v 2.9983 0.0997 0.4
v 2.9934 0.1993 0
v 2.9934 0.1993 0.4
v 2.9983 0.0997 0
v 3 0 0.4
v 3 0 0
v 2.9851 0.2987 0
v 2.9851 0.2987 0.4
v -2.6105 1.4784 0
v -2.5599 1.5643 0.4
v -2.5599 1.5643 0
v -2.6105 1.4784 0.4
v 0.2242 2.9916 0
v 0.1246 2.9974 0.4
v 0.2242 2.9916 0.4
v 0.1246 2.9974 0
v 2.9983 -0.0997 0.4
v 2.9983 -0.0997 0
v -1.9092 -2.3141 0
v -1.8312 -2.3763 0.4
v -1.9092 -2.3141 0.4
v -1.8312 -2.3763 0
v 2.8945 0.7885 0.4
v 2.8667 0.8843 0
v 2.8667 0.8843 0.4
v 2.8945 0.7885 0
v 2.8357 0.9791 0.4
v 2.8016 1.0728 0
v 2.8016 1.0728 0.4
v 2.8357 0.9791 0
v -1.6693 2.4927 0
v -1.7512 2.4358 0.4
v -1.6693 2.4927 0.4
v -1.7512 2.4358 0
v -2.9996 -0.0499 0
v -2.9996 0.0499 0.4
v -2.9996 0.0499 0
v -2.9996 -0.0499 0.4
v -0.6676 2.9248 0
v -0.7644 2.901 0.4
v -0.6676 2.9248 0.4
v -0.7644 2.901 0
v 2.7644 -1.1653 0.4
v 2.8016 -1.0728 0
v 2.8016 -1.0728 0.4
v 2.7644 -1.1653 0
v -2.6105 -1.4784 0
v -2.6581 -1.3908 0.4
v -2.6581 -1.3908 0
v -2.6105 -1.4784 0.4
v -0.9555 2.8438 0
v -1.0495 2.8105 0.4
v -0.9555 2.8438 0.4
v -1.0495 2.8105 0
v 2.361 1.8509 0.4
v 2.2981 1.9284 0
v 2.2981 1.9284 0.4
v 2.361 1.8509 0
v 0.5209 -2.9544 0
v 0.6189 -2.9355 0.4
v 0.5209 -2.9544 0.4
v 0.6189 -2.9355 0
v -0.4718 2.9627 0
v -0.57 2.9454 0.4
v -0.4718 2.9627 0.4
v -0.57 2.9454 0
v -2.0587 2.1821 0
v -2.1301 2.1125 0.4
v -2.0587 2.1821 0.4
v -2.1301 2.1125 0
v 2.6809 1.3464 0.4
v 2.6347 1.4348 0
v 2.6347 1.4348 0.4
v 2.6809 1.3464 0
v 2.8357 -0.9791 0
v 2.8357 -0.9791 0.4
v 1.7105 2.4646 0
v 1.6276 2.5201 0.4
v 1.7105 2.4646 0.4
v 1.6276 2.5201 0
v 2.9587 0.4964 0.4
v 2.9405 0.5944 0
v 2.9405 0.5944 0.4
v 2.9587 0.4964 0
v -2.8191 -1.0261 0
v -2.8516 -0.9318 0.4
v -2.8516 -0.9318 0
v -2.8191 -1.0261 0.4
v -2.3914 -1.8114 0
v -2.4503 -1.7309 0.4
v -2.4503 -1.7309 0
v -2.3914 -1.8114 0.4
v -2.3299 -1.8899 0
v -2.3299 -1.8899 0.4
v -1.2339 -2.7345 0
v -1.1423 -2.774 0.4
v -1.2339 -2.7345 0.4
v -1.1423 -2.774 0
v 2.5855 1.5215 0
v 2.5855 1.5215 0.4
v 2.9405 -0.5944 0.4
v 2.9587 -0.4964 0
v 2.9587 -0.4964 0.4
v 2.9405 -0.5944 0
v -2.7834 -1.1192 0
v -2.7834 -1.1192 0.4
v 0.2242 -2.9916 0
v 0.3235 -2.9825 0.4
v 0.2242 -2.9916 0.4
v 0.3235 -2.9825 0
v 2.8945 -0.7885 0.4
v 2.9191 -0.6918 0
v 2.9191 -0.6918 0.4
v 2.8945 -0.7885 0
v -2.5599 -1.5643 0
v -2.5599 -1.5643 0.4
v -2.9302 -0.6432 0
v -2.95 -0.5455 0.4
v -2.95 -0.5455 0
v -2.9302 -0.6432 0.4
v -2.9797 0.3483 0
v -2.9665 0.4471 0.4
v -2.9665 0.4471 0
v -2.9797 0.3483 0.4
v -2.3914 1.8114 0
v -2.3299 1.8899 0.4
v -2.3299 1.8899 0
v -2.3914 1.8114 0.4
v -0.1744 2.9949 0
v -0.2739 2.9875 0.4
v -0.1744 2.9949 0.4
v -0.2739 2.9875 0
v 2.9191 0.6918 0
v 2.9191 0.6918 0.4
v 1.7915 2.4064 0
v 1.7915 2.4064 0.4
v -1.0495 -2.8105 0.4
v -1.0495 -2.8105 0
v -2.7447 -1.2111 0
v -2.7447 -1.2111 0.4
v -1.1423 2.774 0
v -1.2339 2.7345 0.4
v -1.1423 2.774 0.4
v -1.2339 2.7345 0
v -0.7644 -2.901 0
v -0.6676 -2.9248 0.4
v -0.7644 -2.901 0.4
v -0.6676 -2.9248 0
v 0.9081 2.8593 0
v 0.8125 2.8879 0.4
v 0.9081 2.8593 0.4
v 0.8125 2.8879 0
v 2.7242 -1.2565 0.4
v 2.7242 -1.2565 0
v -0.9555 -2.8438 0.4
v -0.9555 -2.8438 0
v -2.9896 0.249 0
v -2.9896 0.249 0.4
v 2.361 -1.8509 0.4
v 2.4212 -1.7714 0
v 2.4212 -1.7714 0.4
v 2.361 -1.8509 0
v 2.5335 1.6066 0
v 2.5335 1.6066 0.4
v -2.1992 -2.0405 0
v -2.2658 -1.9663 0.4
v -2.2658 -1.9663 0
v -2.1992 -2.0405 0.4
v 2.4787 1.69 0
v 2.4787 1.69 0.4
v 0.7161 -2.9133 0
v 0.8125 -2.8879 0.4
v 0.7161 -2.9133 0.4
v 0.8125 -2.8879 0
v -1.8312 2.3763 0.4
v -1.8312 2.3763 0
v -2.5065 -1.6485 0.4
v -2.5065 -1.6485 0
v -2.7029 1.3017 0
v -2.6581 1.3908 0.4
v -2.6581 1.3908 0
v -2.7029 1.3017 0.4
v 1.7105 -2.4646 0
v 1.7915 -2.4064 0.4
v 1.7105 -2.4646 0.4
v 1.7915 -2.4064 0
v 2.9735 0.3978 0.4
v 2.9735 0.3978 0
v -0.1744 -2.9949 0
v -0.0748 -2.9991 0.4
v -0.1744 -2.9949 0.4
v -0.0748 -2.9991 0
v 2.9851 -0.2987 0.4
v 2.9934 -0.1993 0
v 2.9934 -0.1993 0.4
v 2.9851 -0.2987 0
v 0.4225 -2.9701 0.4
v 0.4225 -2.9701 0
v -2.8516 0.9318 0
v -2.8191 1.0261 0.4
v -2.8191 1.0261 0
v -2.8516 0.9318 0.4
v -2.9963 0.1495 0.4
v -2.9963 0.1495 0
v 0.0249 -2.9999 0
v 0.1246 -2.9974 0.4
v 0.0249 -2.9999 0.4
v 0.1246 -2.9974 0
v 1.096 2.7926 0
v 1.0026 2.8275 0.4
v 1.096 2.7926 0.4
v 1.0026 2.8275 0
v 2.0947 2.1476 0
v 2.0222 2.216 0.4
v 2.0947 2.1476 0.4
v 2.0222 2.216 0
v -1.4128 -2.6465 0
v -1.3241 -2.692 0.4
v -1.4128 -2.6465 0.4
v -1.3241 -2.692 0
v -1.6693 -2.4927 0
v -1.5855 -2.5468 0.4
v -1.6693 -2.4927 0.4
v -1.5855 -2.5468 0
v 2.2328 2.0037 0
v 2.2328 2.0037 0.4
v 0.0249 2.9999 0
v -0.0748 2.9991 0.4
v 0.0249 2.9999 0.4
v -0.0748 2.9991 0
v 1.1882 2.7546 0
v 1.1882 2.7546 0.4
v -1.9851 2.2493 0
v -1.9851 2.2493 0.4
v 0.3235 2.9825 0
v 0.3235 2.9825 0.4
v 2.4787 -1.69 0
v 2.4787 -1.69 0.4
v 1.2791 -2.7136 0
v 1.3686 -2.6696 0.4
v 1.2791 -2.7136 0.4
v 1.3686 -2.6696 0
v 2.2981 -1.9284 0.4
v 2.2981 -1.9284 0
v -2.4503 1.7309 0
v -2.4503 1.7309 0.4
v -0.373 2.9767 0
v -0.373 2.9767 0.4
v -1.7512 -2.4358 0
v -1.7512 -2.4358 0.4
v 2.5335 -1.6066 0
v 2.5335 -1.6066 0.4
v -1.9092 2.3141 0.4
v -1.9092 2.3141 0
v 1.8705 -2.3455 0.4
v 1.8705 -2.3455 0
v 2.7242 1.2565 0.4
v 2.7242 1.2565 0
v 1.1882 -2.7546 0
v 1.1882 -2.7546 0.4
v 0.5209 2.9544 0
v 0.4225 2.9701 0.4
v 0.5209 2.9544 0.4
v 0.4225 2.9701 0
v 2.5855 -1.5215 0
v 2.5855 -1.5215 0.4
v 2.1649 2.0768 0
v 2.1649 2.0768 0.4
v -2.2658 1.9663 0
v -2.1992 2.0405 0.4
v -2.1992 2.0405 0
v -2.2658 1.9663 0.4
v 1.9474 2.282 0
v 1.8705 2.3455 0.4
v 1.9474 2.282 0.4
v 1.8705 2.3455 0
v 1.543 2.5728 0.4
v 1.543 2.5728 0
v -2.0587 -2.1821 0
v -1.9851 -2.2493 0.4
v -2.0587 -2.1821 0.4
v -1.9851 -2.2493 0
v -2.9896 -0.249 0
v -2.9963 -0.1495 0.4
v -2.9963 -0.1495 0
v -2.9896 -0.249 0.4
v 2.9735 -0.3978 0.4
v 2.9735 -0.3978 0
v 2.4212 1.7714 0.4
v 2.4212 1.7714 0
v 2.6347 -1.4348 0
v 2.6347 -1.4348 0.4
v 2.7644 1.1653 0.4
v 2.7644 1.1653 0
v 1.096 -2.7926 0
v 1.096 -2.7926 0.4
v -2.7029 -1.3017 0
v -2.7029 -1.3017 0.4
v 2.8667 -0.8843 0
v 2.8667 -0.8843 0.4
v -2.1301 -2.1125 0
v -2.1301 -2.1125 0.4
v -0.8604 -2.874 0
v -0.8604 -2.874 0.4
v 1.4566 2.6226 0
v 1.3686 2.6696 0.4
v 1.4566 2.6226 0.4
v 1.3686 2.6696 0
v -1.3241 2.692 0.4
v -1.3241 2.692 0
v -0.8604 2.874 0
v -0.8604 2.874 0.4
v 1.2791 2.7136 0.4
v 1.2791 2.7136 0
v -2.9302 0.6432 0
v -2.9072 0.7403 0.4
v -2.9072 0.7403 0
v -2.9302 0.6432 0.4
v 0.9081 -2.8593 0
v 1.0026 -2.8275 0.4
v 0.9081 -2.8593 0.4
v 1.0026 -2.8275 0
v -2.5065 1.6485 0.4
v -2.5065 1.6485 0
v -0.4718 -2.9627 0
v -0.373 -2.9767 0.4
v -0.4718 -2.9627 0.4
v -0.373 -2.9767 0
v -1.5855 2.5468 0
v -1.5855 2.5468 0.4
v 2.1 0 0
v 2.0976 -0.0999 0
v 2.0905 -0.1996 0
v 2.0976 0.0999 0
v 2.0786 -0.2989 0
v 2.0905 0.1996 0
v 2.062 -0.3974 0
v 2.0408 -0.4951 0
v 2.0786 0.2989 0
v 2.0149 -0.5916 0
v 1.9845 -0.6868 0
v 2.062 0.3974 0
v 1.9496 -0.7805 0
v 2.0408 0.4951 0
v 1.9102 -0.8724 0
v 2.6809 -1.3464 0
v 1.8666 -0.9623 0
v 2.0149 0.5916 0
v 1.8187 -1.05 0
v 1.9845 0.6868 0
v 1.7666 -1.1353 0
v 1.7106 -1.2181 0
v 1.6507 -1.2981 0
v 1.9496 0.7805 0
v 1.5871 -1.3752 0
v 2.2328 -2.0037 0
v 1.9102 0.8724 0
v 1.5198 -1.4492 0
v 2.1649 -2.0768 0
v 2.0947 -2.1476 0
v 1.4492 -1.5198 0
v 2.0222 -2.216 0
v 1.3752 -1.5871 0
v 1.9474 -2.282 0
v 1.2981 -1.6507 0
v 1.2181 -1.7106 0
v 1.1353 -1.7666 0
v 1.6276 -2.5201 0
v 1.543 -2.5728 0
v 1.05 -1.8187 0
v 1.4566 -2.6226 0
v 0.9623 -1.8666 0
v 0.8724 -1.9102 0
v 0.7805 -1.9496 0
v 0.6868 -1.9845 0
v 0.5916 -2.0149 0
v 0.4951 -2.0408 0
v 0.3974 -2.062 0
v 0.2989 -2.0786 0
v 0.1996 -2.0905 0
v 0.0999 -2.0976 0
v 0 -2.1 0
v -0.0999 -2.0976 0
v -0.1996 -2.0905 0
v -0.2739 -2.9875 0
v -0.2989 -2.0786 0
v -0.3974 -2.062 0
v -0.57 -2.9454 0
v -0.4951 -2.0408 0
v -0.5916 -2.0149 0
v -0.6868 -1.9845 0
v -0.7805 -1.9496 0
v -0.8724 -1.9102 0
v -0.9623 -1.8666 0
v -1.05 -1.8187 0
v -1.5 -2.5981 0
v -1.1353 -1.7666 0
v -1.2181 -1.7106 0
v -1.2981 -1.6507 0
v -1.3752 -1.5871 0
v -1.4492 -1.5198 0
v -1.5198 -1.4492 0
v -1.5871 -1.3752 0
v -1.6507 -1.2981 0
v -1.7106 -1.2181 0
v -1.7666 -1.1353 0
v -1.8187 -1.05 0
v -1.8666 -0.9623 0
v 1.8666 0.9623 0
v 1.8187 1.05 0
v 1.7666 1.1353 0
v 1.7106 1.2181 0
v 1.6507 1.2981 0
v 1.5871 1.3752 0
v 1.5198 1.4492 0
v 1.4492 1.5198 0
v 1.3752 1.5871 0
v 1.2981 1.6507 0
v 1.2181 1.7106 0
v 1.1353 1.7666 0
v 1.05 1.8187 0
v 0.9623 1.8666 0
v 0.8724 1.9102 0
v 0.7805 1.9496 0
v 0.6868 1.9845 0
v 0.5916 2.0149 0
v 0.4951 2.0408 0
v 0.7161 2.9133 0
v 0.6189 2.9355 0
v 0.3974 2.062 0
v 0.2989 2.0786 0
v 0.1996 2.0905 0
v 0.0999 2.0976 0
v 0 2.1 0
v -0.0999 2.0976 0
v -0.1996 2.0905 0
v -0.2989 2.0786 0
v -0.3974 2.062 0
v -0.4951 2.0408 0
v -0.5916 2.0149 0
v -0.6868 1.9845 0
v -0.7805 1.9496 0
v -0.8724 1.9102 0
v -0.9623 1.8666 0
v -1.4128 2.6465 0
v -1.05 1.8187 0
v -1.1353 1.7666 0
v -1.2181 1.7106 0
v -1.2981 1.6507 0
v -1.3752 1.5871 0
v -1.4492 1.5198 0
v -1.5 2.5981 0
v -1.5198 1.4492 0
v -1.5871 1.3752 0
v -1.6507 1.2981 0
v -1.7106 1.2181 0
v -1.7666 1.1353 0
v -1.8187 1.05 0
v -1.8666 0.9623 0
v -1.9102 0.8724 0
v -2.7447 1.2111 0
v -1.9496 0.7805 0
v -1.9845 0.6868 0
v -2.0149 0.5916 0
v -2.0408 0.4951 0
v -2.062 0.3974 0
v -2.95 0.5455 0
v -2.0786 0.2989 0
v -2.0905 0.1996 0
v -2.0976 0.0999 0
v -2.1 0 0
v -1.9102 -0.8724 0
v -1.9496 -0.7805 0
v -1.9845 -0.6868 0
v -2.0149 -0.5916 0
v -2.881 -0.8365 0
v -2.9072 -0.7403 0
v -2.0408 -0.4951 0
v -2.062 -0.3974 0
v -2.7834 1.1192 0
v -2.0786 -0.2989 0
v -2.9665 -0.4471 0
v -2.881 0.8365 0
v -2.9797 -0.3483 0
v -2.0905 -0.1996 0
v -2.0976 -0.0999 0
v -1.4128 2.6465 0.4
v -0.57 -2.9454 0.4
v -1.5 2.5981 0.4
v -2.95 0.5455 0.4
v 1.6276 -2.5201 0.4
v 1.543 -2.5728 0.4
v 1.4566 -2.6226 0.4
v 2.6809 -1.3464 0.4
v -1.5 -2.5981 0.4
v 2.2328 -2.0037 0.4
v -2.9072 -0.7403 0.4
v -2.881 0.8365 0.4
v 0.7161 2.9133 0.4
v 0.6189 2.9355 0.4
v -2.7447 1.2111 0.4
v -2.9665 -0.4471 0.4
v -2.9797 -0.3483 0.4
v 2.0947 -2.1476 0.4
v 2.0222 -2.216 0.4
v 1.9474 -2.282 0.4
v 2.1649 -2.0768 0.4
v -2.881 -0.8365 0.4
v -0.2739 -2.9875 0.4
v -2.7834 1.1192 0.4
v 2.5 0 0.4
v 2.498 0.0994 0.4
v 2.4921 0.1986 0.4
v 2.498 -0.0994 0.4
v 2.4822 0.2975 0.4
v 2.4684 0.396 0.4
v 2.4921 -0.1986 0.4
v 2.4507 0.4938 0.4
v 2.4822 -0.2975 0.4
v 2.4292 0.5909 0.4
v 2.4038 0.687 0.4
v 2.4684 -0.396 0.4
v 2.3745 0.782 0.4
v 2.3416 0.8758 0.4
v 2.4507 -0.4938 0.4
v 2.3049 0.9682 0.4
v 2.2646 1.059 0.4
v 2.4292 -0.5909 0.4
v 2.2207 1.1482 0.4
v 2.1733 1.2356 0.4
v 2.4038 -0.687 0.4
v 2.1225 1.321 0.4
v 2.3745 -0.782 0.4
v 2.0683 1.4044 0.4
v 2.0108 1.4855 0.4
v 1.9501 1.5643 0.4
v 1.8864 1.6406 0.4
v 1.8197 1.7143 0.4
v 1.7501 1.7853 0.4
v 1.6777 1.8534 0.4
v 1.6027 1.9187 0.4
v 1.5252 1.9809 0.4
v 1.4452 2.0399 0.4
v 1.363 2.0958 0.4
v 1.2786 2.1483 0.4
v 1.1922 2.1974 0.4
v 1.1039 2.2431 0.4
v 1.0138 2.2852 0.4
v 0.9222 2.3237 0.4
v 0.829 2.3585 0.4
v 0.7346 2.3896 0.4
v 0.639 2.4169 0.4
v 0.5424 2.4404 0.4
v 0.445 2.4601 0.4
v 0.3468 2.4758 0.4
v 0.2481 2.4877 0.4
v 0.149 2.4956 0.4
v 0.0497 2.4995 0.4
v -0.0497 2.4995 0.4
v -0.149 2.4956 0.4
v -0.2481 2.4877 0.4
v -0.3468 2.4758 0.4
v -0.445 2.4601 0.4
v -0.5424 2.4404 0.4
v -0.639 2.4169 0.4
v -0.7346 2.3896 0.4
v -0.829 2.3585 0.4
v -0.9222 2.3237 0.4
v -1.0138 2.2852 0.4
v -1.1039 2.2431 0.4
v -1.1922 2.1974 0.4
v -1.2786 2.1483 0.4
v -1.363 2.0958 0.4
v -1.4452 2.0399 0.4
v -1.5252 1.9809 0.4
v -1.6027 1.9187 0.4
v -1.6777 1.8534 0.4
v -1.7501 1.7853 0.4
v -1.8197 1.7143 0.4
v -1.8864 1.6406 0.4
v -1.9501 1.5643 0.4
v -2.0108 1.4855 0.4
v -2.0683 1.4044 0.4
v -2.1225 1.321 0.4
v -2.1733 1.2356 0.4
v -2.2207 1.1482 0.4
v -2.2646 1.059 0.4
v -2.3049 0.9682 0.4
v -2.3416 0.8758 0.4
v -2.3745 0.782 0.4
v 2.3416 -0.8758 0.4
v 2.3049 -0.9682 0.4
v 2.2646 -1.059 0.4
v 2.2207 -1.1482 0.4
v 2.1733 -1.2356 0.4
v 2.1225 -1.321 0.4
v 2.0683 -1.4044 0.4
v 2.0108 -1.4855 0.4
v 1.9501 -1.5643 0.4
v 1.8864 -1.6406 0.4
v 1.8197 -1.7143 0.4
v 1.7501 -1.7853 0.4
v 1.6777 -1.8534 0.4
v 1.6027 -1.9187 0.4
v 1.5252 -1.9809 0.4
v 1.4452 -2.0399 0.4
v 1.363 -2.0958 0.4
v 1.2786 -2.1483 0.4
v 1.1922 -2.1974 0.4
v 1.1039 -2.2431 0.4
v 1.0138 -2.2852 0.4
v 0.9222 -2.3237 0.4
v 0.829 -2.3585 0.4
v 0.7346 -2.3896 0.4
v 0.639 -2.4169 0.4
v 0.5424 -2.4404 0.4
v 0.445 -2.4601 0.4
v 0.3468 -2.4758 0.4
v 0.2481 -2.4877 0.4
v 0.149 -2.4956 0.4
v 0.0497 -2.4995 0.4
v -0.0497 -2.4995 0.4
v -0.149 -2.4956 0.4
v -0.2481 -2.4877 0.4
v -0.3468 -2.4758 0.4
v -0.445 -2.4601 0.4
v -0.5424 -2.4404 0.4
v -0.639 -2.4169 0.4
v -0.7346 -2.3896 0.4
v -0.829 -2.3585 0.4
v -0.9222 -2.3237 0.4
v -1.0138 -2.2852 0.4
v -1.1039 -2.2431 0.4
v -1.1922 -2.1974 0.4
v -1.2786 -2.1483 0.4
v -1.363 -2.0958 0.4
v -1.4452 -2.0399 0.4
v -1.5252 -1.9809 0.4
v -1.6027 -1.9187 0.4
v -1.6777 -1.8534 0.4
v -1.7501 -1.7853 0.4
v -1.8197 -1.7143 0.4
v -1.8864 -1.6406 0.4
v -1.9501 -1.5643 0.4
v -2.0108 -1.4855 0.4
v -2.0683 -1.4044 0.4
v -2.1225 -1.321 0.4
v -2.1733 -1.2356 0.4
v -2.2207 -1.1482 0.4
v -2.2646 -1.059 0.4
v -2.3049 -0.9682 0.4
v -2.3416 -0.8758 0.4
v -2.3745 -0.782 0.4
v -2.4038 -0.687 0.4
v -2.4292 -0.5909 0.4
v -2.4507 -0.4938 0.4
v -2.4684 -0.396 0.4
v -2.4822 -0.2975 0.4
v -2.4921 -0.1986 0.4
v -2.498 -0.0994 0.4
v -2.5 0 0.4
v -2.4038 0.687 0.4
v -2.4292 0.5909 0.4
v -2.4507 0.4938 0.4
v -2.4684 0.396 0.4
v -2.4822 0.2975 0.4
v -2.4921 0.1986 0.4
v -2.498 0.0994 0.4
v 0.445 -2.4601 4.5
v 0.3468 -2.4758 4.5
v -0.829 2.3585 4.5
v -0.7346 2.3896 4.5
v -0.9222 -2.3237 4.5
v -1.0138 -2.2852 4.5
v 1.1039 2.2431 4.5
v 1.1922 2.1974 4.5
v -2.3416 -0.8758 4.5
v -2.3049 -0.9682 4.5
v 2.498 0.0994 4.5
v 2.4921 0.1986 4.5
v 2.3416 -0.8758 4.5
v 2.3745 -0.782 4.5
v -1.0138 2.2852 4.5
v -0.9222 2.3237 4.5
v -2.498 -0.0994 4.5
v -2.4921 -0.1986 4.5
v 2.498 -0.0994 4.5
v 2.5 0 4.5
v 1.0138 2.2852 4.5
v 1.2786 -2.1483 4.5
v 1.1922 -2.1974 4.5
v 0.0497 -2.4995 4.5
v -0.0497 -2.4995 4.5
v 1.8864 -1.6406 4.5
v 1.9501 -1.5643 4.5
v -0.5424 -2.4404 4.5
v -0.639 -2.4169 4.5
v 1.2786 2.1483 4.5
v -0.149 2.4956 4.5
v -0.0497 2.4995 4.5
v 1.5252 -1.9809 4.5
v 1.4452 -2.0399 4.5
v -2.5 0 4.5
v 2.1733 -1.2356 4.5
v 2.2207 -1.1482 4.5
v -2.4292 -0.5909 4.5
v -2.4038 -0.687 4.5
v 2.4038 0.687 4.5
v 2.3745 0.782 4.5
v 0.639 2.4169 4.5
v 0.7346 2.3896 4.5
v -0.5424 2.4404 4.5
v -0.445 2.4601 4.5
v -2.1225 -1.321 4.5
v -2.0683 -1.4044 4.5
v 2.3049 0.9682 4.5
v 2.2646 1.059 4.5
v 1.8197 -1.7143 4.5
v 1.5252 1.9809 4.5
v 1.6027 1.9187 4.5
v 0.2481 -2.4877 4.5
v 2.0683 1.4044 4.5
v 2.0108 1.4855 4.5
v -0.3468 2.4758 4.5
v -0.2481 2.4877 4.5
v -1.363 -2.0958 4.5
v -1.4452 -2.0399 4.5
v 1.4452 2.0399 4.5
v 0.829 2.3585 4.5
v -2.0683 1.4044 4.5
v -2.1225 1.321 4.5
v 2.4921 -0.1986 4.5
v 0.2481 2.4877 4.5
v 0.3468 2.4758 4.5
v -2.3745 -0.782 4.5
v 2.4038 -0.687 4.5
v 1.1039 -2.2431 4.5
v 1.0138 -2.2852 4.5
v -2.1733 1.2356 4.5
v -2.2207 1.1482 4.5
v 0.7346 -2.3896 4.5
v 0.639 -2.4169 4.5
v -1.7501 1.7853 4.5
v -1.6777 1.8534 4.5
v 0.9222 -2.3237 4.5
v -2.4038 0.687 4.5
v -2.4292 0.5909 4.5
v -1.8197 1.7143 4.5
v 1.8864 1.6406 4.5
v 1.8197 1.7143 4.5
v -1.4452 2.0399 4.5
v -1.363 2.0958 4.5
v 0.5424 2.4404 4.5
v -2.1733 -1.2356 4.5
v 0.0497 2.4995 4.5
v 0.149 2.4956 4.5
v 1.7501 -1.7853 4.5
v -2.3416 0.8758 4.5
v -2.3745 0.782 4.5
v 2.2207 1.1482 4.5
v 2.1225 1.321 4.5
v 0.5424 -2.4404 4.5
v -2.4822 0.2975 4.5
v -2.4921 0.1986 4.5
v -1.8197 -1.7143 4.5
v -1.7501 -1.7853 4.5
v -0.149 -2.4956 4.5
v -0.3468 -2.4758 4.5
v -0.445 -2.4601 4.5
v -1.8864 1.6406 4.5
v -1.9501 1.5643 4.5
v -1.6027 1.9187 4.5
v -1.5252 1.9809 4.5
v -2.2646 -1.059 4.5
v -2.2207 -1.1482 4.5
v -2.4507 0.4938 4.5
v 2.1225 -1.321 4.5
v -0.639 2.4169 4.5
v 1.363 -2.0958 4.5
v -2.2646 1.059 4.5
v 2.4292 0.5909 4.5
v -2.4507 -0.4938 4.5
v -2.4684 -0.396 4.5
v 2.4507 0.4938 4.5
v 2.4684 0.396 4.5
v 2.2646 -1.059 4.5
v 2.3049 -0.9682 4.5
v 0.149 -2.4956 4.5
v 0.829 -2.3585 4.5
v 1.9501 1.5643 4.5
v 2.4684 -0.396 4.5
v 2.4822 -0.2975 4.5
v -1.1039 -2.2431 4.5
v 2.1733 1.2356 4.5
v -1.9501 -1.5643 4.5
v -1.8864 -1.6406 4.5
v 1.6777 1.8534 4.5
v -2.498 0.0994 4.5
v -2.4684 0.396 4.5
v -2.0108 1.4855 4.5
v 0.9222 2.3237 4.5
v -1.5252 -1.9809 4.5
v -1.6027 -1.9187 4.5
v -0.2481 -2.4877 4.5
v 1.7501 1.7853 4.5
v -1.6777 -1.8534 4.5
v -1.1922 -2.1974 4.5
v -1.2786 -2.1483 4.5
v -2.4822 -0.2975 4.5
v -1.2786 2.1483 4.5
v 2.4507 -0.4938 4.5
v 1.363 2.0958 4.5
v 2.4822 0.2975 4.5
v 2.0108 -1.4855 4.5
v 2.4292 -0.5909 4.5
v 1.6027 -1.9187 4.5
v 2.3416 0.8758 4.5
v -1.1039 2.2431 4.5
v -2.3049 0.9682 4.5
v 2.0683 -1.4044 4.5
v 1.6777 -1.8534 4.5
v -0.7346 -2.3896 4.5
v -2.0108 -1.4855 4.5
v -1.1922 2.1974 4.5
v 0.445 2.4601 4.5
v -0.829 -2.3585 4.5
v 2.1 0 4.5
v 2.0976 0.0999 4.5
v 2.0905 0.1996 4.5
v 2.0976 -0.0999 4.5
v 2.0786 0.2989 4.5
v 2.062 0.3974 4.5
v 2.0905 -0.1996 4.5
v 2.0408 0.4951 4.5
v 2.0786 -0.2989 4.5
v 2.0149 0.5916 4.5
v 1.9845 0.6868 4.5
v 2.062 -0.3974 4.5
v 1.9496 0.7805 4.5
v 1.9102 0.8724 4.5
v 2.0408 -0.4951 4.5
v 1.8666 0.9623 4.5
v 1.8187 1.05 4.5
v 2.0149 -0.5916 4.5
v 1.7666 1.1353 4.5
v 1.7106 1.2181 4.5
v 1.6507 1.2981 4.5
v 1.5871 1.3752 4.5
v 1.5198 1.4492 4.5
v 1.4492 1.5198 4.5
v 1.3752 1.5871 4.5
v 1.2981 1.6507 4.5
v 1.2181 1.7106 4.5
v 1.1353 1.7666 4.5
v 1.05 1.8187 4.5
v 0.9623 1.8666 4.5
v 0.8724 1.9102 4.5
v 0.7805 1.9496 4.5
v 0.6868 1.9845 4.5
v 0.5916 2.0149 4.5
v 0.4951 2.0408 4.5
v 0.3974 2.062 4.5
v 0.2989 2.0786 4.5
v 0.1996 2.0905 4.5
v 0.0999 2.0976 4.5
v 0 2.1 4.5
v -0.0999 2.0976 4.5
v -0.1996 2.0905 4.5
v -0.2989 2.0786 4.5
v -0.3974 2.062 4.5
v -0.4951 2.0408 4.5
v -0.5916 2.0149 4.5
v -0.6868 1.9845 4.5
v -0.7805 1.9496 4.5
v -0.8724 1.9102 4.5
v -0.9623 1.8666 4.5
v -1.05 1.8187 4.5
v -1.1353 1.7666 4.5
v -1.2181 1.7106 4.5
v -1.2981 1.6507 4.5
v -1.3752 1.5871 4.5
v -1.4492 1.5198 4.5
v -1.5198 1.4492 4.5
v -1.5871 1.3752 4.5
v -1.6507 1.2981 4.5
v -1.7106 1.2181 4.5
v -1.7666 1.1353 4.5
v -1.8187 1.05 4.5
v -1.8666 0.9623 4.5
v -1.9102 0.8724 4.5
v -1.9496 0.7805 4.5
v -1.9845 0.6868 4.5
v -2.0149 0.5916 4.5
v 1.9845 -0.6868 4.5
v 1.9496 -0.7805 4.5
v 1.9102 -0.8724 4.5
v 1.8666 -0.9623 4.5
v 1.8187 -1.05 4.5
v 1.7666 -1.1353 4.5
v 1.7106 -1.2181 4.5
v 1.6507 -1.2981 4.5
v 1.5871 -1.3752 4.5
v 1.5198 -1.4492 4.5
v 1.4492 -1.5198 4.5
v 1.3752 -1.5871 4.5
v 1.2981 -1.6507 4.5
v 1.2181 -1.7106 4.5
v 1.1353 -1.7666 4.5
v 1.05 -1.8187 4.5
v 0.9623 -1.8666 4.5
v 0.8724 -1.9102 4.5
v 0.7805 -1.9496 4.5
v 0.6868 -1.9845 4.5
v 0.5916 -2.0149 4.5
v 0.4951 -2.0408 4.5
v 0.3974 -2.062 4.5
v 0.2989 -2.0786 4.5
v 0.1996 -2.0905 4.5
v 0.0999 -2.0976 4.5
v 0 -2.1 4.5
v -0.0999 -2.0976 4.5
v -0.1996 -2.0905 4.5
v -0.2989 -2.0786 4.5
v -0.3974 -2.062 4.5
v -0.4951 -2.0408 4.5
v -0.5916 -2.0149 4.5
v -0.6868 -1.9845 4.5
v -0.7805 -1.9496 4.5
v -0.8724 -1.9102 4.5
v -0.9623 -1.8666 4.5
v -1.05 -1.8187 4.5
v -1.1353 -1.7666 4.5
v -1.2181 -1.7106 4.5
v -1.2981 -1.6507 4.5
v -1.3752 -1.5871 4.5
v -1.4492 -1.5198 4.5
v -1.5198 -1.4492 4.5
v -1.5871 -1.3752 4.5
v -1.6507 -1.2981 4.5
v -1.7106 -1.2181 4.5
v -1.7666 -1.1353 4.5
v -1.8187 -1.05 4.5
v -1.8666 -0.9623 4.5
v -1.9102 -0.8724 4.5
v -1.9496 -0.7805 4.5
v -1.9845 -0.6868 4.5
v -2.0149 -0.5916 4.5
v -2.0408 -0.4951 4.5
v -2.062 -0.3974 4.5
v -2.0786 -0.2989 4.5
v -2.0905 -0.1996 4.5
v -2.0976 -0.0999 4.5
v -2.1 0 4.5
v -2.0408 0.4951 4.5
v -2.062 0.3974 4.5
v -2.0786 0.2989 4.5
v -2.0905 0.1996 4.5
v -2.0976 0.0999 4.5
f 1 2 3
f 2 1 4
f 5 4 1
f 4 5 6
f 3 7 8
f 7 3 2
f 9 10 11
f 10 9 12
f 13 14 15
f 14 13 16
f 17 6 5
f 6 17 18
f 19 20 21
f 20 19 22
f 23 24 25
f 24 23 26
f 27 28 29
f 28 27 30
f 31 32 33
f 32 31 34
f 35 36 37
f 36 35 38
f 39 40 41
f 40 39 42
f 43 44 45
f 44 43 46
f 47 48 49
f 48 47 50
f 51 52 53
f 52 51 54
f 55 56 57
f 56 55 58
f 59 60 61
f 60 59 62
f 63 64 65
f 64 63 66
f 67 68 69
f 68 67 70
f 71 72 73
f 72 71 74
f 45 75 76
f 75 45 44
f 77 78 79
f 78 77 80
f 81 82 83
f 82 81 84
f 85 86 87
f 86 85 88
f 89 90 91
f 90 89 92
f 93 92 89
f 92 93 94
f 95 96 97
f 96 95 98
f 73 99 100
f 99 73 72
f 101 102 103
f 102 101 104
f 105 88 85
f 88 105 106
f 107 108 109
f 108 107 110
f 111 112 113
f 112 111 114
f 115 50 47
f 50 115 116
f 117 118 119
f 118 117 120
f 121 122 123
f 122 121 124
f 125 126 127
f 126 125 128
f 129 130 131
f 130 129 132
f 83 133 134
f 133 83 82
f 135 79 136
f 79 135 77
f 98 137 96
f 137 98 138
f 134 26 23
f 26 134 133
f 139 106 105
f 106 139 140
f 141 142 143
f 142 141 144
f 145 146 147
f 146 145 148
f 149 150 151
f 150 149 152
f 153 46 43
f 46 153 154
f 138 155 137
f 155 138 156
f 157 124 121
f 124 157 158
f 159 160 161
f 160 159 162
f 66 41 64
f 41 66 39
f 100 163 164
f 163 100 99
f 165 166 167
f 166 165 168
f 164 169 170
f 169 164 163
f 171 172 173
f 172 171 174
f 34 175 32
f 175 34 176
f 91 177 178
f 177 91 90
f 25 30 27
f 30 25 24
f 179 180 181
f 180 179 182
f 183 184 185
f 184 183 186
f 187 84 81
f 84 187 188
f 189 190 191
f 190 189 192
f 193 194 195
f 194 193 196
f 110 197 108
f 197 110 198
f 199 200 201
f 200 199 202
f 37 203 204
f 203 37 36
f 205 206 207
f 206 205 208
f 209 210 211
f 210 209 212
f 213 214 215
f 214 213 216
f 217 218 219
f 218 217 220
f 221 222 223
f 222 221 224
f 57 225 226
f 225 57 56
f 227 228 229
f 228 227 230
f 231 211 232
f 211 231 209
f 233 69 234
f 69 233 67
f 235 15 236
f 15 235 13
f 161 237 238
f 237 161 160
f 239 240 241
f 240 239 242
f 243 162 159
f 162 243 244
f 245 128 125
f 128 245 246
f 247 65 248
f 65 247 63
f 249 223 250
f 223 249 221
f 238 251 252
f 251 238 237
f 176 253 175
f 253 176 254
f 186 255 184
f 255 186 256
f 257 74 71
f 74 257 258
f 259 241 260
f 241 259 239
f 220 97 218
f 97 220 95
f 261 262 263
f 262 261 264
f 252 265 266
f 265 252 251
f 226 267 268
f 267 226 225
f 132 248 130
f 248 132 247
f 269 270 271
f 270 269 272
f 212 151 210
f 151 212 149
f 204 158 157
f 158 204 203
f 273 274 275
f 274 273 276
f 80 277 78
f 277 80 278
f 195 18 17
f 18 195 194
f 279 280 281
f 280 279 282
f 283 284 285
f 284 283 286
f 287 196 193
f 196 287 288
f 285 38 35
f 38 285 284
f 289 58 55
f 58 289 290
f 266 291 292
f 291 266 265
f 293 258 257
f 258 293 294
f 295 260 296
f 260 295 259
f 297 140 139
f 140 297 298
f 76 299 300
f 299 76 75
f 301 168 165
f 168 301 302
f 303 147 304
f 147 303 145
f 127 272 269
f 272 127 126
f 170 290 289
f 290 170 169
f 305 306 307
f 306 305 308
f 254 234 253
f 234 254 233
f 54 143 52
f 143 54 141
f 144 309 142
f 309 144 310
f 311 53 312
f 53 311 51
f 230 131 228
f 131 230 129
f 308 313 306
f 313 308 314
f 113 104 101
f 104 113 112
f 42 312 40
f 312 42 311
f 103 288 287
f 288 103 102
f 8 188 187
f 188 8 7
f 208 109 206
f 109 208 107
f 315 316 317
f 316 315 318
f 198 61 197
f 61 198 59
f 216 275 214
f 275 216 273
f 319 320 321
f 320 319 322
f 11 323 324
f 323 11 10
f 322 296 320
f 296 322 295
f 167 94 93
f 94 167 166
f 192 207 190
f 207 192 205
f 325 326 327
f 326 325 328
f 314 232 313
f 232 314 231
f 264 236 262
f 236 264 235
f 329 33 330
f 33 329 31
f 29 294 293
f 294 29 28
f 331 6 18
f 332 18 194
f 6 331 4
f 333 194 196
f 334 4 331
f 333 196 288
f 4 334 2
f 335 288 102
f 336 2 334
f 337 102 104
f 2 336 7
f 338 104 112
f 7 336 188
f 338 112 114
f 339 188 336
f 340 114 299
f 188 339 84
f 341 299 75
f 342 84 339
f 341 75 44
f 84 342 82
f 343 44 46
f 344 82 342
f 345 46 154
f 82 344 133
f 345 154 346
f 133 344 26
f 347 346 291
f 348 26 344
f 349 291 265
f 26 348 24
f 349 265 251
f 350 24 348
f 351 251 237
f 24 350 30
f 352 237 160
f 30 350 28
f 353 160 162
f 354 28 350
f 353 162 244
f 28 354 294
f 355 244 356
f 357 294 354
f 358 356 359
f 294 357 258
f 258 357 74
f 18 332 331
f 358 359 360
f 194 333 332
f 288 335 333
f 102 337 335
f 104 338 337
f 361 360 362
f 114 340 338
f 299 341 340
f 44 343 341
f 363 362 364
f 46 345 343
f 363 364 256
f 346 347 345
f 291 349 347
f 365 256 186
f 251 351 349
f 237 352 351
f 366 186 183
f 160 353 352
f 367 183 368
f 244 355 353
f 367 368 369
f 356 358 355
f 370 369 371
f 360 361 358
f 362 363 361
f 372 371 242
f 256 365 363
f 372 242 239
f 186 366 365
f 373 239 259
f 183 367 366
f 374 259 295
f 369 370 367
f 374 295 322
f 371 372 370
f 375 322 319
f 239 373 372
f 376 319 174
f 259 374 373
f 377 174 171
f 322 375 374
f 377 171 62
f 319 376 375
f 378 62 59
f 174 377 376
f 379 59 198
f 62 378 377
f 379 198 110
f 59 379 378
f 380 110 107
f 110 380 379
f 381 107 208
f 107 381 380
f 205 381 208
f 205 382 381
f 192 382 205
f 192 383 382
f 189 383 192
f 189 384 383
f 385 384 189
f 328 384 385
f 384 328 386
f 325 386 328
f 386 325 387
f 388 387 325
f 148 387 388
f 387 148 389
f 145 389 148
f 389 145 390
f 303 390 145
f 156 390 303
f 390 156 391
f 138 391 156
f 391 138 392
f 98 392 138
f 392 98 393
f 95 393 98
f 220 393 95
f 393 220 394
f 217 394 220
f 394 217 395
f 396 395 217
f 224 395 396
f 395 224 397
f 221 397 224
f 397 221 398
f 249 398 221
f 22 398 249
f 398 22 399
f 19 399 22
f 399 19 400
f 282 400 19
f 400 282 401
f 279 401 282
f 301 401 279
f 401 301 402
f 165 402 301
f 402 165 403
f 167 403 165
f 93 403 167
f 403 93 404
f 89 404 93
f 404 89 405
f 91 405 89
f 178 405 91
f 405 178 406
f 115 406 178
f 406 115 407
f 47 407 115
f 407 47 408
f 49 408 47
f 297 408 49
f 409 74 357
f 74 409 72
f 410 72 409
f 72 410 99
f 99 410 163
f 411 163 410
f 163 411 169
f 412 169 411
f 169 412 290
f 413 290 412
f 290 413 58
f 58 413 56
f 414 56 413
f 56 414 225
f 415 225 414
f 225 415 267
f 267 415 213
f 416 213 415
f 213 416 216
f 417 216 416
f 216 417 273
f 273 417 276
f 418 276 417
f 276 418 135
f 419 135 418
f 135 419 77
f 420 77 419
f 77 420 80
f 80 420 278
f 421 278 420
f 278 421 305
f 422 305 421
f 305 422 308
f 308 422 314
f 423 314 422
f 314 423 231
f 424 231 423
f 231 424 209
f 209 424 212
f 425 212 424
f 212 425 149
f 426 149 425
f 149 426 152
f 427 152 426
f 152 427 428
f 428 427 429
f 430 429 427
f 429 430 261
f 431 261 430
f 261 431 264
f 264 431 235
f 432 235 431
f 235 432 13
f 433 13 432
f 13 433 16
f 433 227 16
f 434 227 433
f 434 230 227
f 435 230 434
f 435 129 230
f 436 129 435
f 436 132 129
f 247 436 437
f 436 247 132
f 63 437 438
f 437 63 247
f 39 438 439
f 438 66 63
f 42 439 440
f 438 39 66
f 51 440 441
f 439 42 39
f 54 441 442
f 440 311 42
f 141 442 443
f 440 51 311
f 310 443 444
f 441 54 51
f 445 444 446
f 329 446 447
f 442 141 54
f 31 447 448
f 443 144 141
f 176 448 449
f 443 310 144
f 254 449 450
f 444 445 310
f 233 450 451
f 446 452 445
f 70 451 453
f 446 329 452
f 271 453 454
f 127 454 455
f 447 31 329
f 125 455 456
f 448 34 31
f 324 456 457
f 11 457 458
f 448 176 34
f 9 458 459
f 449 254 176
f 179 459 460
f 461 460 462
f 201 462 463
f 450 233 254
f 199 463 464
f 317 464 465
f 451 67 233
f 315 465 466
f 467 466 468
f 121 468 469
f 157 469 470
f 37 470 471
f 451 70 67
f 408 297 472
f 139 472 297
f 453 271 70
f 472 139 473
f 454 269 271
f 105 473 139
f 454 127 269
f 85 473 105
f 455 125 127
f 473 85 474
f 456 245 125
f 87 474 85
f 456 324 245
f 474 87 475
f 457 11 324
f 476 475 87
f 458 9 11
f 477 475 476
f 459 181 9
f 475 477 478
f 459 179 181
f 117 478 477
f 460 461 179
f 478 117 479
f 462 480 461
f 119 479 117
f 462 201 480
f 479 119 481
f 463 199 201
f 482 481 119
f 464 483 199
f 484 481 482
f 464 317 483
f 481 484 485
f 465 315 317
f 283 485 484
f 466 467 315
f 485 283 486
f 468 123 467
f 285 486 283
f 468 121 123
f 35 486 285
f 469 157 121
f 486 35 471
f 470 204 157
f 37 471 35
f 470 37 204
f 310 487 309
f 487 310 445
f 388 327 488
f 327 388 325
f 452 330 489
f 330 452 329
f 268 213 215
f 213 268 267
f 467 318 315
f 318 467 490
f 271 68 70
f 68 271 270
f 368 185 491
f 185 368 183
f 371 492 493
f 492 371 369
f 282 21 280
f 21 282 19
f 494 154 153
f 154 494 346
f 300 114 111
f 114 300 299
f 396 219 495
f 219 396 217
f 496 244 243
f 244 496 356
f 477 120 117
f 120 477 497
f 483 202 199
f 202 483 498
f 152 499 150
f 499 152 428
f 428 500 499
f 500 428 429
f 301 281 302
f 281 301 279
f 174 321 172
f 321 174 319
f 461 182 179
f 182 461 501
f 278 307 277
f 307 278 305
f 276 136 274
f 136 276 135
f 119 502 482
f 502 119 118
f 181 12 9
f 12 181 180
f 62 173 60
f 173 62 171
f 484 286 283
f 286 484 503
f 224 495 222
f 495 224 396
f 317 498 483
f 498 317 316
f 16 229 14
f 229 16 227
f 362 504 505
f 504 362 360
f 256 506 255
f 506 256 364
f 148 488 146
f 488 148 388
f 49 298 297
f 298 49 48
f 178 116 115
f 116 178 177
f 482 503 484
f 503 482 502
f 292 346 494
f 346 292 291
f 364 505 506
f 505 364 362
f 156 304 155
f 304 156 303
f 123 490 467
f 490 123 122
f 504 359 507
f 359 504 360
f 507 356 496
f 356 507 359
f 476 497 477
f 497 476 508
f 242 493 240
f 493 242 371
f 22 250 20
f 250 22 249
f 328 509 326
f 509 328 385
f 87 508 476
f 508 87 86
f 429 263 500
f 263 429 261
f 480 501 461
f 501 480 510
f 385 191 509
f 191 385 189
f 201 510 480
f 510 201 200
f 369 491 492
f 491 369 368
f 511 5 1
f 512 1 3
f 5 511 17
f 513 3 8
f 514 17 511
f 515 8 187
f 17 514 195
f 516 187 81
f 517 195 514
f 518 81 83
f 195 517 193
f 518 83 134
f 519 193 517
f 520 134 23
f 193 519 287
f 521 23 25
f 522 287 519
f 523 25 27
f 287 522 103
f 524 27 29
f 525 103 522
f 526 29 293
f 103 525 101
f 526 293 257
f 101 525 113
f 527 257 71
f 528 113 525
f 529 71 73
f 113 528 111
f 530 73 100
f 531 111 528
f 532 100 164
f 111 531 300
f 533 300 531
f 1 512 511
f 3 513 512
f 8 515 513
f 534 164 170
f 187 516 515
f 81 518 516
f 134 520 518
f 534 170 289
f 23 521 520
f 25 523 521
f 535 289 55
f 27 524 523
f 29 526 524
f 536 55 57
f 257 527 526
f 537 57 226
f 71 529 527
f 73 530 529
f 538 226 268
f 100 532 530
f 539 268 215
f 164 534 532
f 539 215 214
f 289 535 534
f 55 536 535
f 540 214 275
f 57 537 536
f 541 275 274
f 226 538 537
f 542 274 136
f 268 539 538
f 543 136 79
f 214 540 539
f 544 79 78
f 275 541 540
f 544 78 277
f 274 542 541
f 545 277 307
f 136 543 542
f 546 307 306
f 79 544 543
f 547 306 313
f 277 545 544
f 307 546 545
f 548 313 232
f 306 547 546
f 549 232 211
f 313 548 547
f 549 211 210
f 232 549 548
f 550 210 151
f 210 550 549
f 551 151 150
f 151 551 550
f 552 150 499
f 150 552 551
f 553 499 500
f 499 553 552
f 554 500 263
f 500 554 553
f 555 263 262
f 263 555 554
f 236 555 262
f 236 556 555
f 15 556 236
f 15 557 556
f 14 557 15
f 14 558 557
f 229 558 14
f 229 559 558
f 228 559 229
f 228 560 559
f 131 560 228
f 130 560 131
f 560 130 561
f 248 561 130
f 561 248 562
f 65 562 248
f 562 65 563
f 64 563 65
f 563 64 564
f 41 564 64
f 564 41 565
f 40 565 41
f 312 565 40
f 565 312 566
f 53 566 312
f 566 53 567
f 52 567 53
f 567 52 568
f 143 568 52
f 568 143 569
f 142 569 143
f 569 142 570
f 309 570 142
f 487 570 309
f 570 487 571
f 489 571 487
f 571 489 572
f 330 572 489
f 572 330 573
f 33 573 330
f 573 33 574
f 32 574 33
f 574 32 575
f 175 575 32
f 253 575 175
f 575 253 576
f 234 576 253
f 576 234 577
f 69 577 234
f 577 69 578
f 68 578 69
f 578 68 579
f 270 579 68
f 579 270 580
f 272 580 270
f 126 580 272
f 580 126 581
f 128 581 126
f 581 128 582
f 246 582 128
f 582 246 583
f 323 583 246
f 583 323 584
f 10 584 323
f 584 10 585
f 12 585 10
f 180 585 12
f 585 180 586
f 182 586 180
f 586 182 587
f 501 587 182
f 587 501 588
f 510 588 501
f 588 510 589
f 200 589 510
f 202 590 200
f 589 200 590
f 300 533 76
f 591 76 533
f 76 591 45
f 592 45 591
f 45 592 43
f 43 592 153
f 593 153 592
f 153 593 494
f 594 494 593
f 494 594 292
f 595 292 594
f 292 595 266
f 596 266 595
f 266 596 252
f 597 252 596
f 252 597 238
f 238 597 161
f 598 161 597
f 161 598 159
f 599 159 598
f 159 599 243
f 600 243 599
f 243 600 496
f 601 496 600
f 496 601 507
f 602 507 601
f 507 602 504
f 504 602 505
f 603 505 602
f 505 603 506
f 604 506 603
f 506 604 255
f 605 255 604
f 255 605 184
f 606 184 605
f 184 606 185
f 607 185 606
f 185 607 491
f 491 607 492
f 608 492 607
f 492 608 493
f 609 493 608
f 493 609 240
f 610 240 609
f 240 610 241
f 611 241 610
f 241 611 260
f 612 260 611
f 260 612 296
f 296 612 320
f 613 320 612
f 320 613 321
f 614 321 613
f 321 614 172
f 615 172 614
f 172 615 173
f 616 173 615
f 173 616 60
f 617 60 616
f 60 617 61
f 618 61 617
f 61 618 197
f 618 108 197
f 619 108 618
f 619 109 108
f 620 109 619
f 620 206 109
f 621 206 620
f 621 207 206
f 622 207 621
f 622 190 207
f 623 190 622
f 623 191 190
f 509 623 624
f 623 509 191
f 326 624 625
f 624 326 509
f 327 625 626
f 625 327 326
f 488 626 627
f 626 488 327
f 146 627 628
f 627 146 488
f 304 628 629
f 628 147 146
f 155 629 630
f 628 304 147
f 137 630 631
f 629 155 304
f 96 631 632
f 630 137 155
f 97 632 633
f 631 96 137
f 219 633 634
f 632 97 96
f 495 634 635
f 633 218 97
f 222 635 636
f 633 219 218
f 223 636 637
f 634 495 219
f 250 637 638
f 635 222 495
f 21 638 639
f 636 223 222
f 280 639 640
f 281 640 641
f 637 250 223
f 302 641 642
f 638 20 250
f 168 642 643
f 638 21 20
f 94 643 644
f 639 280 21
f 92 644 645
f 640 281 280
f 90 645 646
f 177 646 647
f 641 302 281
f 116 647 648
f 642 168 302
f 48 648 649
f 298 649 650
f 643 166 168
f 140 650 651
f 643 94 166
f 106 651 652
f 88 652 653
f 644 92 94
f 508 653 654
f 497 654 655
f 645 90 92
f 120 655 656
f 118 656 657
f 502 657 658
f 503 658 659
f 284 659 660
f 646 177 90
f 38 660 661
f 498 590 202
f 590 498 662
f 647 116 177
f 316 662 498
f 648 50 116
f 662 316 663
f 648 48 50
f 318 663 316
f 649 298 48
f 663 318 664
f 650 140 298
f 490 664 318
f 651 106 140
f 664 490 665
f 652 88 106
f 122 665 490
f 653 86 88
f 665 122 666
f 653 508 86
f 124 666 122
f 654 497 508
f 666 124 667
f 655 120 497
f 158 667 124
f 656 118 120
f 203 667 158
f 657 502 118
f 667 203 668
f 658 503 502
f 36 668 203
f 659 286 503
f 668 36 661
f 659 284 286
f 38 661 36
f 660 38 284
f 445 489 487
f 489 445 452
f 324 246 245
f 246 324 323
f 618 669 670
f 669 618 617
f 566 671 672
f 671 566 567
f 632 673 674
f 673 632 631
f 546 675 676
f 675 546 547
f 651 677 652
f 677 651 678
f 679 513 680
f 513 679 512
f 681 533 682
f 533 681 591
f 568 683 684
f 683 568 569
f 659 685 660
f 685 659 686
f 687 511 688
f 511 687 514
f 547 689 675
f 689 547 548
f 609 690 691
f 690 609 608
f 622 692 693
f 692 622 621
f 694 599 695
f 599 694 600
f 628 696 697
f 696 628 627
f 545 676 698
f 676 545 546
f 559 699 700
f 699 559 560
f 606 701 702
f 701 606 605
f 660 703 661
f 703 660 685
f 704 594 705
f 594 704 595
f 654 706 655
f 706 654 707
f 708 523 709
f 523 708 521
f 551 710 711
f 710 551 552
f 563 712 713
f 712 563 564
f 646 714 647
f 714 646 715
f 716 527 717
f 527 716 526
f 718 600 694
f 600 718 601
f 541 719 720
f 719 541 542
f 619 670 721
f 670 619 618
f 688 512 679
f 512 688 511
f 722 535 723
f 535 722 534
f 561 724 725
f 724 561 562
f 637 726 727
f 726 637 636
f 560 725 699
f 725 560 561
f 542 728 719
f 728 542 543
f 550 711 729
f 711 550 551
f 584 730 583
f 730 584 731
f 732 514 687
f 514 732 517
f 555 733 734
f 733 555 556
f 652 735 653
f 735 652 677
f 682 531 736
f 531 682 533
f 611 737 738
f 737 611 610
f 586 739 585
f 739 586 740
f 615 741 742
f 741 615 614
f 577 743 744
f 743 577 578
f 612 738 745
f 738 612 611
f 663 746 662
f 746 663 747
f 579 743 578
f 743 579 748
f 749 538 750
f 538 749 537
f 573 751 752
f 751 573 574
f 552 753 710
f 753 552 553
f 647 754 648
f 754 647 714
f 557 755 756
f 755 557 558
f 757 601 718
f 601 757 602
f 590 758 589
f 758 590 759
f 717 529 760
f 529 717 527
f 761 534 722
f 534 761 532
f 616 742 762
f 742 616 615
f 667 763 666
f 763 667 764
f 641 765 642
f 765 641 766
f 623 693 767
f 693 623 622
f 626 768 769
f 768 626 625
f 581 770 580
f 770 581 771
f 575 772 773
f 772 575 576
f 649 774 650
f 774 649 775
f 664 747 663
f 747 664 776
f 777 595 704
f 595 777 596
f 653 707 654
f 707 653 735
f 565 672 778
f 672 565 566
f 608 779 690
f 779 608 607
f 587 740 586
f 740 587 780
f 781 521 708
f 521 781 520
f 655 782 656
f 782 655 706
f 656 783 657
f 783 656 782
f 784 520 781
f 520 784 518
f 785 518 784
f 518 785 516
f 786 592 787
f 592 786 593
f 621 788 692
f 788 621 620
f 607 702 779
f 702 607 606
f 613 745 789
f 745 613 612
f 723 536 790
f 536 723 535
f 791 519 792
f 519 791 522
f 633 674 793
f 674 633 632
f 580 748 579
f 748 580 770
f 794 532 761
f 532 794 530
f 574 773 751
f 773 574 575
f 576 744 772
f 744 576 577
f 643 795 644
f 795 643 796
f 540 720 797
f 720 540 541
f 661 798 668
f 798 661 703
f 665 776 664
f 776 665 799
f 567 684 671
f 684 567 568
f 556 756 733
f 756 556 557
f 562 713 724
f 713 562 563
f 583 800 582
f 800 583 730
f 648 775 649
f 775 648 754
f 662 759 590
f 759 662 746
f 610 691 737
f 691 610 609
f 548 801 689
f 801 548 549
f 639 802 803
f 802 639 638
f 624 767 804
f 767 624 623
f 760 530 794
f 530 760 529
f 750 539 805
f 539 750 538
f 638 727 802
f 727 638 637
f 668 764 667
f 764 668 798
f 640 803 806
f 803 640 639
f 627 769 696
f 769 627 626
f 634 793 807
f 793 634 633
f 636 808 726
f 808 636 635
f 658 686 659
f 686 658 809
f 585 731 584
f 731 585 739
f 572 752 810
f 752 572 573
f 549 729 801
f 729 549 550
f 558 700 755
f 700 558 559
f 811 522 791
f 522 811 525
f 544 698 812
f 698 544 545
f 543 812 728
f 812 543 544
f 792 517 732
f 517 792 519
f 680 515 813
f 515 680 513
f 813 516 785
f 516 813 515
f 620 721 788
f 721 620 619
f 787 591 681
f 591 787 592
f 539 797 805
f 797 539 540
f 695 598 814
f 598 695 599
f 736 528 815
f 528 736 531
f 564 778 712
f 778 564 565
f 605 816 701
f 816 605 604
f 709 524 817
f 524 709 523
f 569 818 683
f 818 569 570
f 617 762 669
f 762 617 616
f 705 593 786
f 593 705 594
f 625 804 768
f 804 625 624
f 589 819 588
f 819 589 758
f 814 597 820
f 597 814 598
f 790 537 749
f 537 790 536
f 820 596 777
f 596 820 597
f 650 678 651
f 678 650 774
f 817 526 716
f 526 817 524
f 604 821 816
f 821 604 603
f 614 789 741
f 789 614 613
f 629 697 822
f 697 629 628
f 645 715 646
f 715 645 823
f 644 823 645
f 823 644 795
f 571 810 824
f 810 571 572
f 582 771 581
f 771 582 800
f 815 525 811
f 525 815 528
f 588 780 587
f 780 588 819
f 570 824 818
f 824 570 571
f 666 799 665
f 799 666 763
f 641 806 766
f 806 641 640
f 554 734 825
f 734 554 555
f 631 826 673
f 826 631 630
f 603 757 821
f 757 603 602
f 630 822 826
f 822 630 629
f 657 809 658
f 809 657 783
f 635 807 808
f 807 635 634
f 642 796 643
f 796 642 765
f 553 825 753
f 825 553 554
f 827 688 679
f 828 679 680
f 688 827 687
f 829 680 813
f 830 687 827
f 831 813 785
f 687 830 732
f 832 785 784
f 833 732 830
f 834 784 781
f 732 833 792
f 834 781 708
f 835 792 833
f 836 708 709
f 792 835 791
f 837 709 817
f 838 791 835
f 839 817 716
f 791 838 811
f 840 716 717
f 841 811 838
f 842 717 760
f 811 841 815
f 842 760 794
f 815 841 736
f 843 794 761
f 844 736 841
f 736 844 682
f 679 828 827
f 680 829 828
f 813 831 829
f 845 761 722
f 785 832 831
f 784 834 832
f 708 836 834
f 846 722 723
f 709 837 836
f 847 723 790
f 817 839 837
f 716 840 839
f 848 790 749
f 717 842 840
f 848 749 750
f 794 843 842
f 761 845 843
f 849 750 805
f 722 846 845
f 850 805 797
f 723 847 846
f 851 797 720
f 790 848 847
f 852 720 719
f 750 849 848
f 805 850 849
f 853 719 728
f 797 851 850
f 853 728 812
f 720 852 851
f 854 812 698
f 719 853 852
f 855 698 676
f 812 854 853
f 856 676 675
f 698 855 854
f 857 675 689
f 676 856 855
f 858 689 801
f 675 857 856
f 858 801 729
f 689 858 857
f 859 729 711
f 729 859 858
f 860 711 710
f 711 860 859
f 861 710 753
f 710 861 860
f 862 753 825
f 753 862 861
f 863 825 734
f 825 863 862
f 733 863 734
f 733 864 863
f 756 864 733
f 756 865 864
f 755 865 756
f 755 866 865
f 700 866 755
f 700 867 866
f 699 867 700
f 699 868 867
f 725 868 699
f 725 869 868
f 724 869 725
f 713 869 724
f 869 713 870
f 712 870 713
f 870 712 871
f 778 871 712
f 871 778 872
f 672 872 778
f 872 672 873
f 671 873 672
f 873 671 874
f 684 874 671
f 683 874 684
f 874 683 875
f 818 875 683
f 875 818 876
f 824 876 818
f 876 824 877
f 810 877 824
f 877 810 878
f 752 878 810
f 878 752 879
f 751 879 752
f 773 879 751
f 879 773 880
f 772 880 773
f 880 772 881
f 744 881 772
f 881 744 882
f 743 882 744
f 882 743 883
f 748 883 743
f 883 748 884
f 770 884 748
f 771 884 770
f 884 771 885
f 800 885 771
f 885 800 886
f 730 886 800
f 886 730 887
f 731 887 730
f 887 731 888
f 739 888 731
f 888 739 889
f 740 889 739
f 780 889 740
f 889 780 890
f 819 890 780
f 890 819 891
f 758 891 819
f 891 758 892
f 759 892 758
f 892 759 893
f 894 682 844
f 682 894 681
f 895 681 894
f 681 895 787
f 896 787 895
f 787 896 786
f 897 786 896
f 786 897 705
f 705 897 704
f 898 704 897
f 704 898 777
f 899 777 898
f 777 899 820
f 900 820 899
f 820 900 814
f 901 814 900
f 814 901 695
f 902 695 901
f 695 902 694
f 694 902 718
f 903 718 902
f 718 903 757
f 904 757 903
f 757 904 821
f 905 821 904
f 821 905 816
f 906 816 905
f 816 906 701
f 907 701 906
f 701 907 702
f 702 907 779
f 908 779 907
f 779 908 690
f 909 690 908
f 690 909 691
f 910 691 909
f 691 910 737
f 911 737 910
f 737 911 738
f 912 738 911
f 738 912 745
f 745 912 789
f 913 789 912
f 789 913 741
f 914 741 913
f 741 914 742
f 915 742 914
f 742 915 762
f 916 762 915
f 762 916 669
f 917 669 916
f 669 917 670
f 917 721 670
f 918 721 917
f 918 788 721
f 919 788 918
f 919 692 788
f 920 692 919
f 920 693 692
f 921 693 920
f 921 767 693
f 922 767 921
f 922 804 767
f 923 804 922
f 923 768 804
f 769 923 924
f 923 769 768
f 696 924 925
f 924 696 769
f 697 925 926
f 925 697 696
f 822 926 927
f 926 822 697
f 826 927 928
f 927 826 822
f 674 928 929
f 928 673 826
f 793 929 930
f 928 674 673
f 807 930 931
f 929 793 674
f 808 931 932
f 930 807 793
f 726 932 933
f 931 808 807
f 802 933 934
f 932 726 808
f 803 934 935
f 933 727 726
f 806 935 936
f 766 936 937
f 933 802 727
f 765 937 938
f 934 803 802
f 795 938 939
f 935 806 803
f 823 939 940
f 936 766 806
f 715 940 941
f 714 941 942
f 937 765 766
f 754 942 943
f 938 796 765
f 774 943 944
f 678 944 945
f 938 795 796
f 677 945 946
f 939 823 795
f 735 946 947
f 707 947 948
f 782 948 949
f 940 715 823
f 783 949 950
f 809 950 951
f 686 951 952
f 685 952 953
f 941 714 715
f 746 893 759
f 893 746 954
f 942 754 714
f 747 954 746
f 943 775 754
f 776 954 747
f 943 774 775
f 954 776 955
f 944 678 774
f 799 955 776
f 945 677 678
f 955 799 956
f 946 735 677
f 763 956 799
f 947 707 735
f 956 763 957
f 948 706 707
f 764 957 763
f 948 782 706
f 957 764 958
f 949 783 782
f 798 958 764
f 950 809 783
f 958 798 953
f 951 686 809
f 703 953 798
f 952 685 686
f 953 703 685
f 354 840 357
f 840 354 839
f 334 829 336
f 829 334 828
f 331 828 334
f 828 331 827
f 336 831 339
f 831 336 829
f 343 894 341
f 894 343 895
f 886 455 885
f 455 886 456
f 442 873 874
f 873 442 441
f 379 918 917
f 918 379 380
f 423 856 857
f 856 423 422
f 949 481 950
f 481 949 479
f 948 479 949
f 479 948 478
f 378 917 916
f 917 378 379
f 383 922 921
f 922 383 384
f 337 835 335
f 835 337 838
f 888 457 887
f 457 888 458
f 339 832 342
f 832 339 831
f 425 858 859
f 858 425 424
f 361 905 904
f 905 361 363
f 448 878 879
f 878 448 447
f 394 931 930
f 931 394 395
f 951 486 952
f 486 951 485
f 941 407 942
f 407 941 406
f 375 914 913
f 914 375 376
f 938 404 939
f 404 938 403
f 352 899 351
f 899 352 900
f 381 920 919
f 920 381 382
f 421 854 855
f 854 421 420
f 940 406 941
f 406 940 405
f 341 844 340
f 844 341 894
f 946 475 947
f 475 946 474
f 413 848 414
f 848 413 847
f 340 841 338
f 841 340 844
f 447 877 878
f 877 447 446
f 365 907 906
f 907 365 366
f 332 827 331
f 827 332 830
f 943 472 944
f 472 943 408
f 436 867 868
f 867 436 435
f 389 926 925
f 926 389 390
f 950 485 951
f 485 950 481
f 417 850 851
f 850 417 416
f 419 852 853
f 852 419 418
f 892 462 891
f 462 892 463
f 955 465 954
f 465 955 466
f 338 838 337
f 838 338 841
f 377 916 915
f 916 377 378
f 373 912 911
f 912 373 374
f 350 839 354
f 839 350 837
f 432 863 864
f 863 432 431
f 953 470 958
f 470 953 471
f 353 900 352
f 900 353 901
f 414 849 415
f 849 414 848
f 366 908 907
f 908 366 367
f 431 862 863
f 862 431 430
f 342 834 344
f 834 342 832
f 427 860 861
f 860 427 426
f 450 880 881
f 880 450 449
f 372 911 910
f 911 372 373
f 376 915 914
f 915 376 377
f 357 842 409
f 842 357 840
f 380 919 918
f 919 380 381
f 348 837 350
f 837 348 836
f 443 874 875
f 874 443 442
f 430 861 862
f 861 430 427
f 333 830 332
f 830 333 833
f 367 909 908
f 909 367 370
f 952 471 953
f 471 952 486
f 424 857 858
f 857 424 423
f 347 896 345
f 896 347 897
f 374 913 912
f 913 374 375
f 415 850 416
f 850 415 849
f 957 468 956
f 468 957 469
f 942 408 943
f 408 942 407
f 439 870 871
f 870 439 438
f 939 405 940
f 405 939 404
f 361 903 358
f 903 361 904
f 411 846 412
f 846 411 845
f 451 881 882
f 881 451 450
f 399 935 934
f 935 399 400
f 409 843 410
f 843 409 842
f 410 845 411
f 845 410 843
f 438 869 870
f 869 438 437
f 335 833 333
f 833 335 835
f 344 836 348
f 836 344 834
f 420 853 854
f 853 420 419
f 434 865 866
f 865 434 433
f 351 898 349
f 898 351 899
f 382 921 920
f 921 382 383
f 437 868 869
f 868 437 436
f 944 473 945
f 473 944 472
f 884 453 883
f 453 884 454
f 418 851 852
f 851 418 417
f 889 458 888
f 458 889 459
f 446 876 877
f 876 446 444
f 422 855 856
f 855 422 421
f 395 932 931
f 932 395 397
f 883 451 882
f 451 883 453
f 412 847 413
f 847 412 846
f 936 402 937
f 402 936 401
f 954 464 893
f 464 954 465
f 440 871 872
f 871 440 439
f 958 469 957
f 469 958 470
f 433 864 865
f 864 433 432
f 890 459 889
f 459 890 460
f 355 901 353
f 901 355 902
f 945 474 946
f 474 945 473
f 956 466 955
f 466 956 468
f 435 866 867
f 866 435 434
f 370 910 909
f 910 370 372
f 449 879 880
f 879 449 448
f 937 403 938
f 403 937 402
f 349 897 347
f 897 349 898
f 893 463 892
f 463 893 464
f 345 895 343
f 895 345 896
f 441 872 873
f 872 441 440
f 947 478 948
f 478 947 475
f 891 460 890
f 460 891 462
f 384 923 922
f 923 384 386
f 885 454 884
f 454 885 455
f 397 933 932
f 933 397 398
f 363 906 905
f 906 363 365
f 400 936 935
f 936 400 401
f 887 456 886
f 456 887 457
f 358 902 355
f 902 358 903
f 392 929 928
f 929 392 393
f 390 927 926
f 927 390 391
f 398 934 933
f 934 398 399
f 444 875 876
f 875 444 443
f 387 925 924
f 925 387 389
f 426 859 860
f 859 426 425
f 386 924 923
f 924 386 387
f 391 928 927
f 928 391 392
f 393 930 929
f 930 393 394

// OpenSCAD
// -*- mode: SCAD ; c-file-style: "ellemtel" ; coding: utf-8 -*-
//
// Buchse (bushing)
//
// © 2017 Roland Sieker <ospalh@gmail.com>
// Licence: CC-0 4.0

d_i = 4.2;
d_a = 5;
h = 4.5;
d_k = 6;
h_k = 0.4;

preview = false;

ms = 0.1;  // Muggeseggele



pa = 5;
ps = 1;
ra = 1;
rs = 0.1;
$fs = (preview) ? ps : rs;
$fa = (preview) ? pa : ra;



difference()
{
   union()
   {
      cylinder(d=d_k, h=h_k);
      cylinder(d=d_a, h=h);
   }
   translate([0,0,-ms])
   {
      cylinder(d=d_i, h=h+2*ms);
   }
}
